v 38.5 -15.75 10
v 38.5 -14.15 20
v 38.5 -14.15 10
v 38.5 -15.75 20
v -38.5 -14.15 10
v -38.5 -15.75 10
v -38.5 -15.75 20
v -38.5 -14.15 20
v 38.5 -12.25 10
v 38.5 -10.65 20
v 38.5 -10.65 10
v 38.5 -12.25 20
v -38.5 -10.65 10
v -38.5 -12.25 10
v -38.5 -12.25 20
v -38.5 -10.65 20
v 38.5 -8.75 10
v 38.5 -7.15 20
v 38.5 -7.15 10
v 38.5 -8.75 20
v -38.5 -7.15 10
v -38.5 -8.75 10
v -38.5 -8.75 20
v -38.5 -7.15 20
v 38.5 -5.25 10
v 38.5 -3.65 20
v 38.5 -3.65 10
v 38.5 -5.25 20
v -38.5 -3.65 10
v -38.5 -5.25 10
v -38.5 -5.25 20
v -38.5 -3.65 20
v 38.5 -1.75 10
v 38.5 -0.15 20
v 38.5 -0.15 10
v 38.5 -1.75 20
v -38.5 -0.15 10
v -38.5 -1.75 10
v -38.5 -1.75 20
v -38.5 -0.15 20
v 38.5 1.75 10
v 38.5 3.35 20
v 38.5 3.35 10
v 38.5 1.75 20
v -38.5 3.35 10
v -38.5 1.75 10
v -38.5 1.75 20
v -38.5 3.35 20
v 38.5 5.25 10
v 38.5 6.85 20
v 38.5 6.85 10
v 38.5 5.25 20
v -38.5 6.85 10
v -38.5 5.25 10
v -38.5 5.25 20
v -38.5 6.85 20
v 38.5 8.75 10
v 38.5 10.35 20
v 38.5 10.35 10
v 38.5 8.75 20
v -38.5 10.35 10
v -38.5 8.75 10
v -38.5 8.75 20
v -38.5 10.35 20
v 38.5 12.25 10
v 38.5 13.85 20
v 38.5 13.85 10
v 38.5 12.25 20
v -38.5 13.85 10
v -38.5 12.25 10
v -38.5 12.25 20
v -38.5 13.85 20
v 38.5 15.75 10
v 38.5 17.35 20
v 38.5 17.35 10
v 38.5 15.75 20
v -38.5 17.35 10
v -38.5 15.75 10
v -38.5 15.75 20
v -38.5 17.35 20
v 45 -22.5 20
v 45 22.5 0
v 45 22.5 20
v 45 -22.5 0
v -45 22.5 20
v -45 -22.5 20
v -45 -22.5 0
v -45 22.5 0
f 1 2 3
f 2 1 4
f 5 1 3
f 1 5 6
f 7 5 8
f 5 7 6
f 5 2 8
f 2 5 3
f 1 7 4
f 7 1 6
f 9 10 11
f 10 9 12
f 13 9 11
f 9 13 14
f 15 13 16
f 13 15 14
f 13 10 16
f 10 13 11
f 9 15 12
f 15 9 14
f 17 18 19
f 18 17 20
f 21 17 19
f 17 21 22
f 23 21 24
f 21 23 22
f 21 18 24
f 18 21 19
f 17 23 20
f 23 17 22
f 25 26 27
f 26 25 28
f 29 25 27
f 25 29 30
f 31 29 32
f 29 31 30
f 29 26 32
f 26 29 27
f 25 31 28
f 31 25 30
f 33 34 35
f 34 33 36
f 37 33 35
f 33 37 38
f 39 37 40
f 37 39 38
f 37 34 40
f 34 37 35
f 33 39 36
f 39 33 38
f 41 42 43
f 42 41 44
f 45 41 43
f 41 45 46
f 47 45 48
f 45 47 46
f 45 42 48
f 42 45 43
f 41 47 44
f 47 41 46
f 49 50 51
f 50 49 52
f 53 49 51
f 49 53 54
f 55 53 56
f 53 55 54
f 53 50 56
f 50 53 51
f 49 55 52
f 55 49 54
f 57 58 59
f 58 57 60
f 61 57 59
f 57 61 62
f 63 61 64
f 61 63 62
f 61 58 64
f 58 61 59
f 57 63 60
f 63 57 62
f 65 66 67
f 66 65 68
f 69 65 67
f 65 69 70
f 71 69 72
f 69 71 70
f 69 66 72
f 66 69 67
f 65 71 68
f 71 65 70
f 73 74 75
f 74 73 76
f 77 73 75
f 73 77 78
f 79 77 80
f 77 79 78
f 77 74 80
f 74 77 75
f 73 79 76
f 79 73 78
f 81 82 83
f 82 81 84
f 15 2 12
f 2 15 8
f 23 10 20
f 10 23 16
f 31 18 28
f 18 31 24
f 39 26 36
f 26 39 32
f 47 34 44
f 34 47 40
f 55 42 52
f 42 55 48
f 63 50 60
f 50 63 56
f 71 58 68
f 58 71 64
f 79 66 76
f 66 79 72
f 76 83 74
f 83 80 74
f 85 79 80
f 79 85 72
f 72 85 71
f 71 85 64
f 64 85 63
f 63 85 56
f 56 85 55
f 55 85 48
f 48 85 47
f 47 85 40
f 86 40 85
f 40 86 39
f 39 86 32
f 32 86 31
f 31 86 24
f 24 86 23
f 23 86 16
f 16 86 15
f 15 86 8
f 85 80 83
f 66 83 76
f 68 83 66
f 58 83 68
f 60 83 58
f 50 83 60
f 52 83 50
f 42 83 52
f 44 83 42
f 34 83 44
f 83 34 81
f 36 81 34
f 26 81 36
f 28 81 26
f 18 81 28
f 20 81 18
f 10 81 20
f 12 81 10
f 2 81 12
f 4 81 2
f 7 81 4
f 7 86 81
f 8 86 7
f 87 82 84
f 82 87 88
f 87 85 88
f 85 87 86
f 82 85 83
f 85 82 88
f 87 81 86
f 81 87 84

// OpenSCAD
// Microscope slide drying rack
// Print orientation: base block on XY plane, slots open upward (+Z)

// ---------------- Parameters ----------------
block_len    = 90;    // base block length along X (mm)
block_wid    = 45;    // base block width along Y (mm)
block_h      = 20;    // base block height along Z (mm)

slot_count   = 10;    // number of microscope slide slots
slot_len     = 77;    // slot length along X (mm)
slot_w       = 1.6;   // slot width along Y (mm)
slot_depth   = 10;    // slot depth into block from top face (mm)
slot_pitch   = 3.5;   // centre-to-centre slot spacing along Y (mm)

eps          = 0.5;   // overshoot so cutters pass cleanly through the top face (mm)

$fn = 64;

// ---------------- Model ----------------
difference() {
    // Solid base block, centred in X and Y, sitting on z = 0
    translate([-block_len / 2, -block_wid / 2, 0])
        cube([block_len, block_wid, block_h]);

    // Parallel slots running along X, centred as a group in X and Y
    for (i = [0 : slot_count - 1]) {
        x = (i - (slot_count - 1) / 2) * slot_pitch;   // slot centre in Y
        translate([-slot_len / 2, x, block_h - slot_depth])
            cube([slot_len, slot_w, slot_depth + eps]);
    }
}
